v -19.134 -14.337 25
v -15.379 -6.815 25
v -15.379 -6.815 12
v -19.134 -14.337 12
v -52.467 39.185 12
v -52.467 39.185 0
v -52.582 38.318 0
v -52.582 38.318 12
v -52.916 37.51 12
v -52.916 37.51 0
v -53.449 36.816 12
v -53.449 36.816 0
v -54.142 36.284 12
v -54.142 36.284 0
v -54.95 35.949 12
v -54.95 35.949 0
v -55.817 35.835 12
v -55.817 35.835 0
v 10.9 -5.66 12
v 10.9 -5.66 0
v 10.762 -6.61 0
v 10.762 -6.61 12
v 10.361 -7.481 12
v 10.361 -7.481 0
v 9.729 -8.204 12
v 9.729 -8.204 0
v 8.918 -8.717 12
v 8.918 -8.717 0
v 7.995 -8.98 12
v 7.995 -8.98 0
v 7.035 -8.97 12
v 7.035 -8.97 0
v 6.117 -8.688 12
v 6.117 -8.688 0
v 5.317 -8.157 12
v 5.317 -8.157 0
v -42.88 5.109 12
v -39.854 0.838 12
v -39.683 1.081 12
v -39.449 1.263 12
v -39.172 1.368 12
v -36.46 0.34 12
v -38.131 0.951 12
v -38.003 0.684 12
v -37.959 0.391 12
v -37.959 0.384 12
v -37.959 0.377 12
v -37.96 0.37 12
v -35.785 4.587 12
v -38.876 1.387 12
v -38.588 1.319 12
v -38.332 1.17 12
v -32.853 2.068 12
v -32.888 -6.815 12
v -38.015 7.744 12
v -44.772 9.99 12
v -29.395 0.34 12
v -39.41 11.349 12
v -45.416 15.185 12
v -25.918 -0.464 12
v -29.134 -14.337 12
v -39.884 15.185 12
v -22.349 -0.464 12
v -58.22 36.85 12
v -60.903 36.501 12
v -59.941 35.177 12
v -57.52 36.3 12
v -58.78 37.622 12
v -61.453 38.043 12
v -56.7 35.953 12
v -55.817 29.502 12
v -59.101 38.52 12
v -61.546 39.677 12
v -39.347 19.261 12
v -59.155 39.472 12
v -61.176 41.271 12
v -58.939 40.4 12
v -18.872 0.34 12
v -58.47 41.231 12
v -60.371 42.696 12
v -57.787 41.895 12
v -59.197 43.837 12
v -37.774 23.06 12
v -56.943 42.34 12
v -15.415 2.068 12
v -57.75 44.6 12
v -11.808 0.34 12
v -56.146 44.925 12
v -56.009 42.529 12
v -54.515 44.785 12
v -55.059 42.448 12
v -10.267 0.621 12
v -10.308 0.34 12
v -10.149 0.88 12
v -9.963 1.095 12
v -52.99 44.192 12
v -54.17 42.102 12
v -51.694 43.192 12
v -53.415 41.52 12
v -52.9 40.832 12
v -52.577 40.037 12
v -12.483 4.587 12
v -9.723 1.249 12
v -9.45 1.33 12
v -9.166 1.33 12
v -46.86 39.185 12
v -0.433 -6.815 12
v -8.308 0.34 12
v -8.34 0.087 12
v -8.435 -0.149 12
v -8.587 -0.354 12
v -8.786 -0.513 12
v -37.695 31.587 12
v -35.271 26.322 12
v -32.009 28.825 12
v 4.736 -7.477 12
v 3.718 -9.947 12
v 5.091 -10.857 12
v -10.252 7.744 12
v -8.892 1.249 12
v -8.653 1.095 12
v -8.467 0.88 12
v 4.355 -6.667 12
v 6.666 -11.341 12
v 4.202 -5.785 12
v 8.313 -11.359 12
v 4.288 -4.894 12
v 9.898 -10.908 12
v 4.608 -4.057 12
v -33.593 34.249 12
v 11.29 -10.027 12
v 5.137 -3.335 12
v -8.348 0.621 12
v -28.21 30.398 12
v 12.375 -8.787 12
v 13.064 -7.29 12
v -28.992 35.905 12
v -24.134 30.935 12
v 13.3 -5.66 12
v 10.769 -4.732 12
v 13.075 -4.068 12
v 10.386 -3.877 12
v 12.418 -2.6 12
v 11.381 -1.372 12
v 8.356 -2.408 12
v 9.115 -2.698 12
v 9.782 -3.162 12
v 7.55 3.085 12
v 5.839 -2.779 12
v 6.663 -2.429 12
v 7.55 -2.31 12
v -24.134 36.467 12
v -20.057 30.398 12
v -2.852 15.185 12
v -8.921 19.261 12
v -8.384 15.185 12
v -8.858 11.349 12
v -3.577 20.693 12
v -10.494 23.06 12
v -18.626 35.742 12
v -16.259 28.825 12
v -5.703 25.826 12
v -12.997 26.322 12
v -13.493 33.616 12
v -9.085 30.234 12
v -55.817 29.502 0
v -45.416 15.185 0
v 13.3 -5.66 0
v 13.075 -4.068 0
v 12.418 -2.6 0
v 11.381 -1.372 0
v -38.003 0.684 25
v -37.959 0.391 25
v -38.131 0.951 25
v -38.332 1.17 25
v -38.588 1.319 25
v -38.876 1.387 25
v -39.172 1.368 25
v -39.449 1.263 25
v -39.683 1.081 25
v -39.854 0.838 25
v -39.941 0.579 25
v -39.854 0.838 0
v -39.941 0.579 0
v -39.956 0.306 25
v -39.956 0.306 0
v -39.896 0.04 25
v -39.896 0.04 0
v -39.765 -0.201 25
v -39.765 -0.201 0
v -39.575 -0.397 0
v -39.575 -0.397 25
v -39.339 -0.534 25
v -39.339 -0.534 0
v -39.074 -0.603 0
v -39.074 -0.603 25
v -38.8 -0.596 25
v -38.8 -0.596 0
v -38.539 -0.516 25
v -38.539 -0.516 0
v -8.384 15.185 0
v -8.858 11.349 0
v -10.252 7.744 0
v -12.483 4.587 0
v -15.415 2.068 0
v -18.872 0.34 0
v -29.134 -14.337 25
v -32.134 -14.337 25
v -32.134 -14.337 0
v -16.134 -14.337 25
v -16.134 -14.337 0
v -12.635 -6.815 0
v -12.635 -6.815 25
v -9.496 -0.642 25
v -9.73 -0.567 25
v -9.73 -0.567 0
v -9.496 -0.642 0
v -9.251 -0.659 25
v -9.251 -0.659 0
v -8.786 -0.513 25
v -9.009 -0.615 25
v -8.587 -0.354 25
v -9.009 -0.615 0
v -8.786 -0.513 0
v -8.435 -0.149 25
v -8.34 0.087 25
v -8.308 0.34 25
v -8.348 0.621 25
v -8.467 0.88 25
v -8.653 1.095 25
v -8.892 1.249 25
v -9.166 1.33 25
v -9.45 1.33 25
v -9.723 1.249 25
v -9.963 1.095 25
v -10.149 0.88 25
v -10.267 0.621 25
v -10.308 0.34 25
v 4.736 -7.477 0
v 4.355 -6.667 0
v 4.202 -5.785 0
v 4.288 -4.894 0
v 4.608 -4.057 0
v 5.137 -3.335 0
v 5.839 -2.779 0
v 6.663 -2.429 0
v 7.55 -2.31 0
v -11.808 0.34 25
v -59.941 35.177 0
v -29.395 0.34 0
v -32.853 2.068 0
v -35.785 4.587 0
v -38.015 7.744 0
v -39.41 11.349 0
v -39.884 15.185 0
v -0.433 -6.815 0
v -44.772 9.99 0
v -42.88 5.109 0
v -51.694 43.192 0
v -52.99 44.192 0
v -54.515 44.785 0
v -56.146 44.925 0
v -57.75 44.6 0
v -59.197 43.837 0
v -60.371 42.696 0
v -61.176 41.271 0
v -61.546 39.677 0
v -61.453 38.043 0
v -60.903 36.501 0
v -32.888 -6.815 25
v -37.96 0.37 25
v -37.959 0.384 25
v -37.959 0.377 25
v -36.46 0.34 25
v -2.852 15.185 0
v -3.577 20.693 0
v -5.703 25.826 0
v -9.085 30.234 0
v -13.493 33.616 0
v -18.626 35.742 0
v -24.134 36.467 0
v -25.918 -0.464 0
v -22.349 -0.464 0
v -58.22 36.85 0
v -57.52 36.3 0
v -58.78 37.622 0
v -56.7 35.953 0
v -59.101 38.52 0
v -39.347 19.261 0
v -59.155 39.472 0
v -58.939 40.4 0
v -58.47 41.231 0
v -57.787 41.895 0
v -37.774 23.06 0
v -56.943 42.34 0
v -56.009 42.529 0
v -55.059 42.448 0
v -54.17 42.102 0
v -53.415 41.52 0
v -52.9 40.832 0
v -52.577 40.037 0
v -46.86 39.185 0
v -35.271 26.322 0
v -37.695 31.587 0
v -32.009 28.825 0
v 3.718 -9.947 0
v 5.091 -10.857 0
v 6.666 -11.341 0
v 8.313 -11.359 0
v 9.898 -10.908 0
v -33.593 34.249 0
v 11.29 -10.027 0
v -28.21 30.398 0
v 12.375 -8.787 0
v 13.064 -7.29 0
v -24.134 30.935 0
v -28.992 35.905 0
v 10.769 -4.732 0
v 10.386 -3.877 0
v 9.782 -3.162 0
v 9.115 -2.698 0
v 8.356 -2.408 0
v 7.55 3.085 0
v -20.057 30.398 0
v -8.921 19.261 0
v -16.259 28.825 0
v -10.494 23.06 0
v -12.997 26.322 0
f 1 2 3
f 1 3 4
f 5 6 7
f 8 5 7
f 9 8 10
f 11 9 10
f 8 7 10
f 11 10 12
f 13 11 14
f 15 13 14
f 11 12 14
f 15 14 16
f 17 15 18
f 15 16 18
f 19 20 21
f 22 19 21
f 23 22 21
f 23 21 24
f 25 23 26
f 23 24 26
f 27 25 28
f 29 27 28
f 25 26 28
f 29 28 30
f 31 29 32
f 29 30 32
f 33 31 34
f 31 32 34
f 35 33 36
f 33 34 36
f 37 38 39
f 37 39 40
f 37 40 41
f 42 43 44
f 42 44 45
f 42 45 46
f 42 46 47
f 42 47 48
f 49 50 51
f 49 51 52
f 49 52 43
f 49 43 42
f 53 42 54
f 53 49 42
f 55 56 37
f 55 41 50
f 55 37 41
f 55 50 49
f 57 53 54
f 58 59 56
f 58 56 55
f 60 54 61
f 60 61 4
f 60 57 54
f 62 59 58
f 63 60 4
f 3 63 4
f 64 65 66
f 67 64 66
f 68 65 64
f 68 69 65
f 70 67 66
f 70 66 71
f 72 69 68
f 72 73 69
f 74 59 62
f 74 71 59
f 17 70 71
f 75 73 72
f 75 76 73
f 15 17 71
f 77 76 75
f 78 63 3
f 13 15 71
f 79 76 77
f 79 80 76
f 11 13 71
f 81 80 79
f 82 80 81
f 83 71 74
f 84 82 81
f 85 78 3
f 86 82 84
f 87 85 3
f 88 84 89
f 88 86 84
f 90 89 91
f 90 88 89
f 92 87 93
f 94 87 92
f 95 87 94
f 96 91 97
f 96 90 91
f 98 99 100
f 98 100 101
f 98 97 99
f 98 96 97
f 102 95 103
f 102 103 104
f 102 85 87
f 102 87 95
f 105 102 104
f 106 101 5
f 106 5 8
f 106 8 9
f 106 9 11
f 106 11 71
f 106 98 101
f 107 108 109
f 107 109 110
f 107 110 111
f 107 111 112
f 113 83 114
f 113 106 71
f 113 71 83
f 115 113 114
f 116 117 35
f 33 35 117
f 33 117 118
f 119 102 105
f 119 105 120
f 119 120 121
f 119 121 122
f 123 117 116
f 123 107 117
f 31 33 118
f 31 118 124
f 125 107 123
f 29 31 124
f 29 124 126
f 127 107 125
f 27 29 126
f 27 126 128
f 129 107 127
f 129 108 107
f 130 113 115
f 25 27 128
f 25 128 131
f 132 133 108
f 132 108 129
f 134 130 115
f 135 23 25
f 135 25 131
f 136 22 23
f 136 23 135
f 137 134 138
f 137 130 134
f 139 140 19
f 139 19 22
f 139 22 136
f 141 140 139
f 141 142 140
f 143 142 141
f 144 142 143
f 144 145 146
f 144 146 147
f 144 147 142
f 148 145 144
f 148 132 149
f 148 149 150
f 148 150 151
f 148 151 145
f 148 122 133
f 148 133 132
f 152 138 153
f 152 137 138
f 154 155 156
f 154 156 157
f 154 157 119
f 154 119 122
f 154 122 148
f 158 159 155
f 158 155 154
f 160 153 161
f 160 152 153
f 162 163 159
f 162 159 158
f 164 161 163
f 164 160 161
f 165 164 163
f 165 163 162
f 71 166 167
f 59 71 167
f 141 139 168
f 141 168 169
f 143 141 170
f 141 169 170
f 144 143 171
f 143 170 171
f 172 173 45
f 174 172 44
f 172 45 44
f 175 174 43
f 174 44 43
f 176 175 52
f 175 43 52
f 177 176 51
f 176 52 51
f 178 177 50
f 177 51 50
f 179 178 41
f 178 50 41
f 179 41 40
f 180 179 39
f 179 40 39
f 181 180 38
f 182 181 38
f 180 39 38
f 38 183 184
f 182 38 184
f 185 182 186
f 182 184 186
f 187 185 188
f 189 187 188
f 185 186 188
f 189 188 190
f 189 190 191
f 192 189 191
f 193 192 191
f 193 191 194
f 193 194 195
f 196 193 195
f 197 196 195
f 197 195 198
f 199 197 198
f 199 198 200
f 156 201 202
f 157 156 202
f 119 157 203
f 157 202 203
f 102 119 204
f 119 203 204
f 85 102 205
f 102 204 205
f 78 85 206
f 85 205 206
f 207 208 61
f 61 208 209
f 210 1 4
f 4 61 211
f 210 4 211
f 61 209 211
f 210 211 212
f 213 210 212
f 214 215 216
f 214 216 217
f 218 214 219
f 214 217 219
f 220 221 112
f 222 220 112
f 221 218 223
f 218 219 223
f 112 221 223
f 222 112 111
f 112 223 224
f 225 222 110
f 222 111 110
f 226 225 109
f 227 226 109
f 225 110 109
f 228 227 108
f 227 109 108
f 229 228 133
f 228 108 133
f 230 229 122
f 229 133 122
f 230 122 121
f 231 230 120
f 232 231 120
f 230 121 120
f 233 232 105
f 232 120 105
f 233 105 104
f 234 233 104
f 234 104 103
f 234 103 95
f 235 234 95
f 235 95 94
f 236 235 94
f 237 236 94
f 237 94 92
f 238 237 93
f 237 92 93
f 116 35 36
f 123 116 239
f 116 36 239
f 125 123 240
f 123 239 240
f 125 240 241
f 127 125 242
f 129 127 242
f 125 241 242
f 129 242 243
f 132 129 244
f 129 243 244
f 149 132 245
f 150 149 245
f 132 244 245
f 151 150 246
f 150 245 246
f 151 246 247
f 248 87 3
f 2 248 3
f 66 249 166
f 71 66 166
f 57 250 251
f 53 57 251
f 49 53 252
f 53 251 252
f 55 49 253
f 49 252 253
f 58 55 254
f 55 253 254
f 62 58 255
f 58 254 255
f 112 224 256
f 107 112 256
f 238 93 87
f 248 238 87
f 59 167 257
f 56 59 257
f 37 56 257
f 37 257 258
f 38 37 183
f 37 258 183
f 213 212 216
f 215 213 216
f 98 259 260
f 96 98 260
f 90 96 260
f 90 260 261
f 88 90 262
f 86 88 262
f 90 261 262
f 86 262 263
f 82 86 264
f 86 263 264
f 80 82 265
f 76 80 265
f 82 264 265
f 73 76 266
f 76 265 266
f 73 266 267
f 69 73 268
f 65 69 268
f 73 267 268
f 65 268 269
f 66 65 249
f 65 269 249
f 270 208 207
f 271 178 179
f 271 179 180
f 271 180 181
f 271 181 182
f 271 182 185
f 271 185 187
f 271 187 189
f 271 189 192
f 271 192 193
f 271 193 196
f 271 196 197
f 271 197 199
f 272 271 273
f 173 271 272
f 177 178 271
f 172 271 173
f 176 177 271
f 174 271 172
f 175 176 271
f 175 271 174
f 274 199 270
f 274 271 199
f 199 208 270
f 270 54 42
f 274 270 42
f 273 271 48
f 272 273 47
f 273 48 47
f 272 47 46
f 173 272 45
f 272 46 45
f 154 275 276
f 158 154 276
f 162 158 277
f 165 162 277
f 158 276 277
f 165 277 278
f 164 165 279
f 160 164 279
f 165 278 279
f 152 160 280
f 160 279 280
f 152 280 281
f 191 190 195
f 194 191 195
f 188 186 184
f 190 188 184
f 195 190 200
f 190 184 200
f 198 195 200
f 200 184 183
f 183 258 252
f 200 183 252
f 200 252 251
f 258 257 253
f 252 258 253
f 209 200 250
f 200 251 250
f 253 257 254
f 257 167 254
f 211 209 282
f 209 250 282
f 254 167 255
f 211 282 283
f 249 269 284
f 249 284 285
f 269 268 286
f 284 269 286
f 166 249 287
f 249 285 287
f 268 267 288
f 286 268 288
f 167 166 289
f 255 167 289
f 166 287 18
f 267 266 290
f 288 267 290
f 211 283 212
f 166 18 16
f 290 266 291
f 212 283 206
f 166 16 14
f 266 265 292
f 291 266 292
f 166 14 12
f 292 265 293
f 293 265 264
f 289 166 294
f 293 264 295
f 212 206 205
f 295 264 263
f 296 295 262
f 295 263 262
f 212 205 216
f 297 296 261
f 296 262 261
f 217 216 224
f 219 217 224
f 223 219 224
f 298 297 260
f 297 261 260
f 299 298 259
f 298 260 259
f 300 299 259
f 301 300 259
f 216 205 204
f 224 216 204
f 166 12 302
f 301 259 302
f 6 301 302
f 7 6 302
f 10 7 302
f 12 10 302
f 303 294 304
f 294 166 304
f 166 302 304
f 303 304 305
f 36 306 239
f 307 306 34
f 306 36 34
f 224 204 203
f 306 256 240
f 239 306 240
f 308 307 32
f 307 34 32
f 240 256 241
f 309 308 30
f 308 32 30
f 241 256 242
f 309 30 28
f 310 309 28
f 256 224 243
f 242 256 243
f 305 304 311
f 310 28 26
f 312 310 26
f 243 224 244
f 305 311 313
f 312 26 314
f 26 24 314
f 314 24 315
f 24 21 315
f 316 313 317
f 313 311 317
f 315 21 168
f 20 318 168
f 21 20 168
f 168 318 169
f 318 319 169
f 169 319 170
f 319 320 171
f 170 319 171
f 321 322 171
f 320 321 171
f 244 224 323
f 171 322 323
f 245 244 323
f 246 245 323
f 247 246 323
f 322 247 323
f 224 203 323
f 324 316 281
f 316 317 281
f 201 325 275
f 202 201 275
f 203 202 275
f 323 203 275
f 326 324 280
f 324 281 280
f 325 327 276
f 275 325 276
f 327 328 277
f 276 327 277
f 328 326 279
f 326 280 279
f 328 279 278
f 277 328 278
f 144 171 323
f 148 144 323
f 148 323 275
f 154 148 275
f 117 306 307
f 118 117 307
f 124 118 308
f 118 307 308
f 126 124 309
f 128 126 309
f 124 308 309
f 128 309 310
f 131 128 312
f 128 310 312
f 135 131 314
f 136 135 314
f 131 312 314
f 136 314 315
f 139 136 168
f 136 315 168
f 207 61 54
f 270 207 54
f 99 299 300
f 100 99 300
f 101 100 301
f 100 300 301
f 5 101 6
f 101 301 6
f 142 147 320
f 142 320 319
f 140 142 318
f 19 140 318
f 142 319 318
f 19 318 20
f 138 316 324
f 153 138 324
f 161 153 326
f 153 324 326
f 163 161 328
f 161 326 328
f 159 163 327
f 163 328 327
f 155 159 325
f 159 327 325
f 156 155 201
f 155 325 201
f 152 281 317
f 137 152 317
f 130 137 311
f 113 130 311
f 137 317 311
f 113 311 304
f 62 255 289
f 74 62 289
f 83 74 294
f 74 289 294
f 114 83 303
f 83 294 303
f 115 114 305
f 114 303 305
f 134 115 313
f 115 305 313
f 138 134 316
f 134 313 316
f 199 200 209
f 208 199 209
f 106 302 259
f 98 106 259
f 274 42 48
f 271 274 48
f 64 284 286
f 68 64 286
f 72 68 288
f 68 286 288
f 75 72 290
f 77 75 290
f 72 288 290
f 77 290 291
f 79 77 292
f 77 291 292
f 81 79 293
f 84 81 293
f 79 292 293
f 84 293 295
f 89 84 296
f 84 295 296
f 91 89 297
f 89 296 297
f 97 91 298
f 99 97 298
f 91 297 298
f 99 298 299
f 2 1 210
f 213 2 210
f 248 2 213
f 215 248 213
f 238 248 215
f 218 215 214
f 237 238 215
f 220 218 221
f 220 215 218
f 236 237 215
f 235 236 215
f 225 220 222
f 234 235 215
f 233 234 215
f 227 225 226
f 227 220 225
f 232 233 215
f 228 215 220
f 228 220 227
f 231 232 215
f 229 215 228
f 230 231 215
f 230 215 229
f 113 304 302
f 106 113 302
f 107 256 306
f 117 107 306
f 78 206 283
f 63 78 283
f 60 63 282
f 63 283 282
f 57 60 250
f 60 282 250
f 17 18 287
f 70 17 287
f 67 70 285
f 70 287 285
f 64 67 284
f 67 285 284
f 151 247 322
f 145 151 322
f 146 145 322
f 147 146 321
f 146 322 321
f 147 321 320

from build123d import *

# Parameters (mm, degrees)
F1_DEPTH = 12
F2_DEPTH = 25


with BuildPart() as f1:
    # F0 (on Top) → F1 (new body)
    with BuildSketch(Plane.XY):
        with BuildLine():
            ThreePointArc((-53.4150354704, 41.5196209399), (-52.7133447938, 40.4447331982), (-52.4674114412, 39.1848640586))
            Line((-52.4674114412, 39.1848640586), (-50.0674114412, 39.1848640586))
            ThreePointArc((-50.0674114412, 39.1848640586), (-50.4895358525, 41.3473260146), (-51.6939302973, 43.1922825863))
            Line((-51.6939302973, 43.1922825863), (-53.4150354704, 41.5196209399))
        make_face()
        with BuildLine():
            Line((-50.0674114412, 39.1848640586), (-52.4674114412, 39.1848640586))
            ThreePointArc((-52.4674114412, 39.1848640586), (-53.4486037242, 36.8160563416), (-55.8174114412, 35.8348640586))
            Line((-55.8174114412, 35.8348640586), (-55.8174114412, 33.4348640586))
            ThreePointArc((-55.8174114412, 33.4348640586), (-51.7515474493, 35.1190000668), (-50.0674114412, 39.1848640586))
        make_face()
        with BuildLine():
            ThreePointArc((-51.6939302973, 43.1922825863), (-50.4895358525, 41.3473260146), (-50.0674114412, 39.1848640586))
            Line((-50.0674114412, 39.1848640586), (-46.8600699283, 39.1848640586))
            Line((-46.8600699283, 39.1848640586), (-51.6939302973, 43.1922825863))
        make_face()
        with BuildLine():
            Line((-46.8600699283, 39.1848640586), (-50.0674114412, 39.1848640586))
            ThreePointArc((-50.0674114412, 39.1848640586), (-51.7515474493, 35.1190000668), (-55.8174114412, 33.4348640586))
            Line((-55.8174114412, 33.4348640586), (-55.8174114412, 29.501699648))
            Line((-55.8174114412, 29.501699648), (-45.4160998232, 15.1848640586))
            ThreePointArc((-45.4160998232, 15.1848640586), (-43.3893572478, 24.2490610317), (-37.6951490668, 31.5868635246))
            Line((-37.6951490668, 31.5868635246), (-46.8600699283, 39.1848640586))
        make_face()
        with BuildLine():
            Line((-55.8174114412, 33.4348640586), (-55.8174114412, 35.8348640586))
            ThreePointArc((-55.8174114412, 35.8348640586), (-57.1214560047, 36.099095471), (-58.219787412, 36.8501071773))
            Line((-58.219787412, 36.8501071773), (-59.9408925851, 35.177445531))
            ThreePointArc((-59.9408925851, 35.177445531), (-58.0556968861, 33.8883955874), (-55.8174114412, 33.4348640586))
        make_face()
        with BuildLine():
            ThreePointArc((-58.219787412, 36.8501071773), (-58.1521683225, 41.5872400294), (-53.4150354704, 41.5196209399))
            Line((-53.4150354704, 41.5196209399), (-51.6939302973, 43.1922825863))
            ThreePointArc((-51.6939302973, 43.1922825863), (-59.8248299688, 43.3083452025), (-59.9408925851, 35.177445531))
            Line((-59.9408925851, 35.177445531), (-58.219787412, 36.8501071773))
        make_face()
        with BuildLine():
            Line((-55.8174114412, 29.501699648), (-55.8174114412, 33.4348640586))
            ThreePointArc((-55.8174114412, 33.4348640586), (-58.0556968861, 33.8883955874), (-59.9408925851, 35.177445531))
            Line((-59.9408925851, 35.177445531), (-55.8174114412, 29.501699648))
        make_face()
        with BuildLine():
            ThreePointArc((-24.1338330771, 36.4671308048), (-31.3401896478, 35.2099309207), (-37.6951490668, 31.5868635246))
            ThreePointArc((-37.6951490668, 31.5868635246), (-43.3893572478, 24.2490610317), (-45.4160998232, 15.1848640586))
            Line((-45.4160998232, 15.1848640586), (-42.6338443592, 15.1848640586))
            Line((-42.6338443592, 15.1848640586), (-39.8838330771, 15.1848640586))
            ThreePointArc((-39.8838330771, 15.1848640586), (-35.2707648808, 26.3217958623), (-24.1338330771, 30.9348640586))
            Line((-24.1338330771, 30.9348640586), (-24.1338330771, 36.4671308048))
        make_face()
        with BuildLine():
            ThreePointArc((-2.8515663309, 15.1848640586), (-9.0849979418, 30.2336991939), (-24.1338330771, 36.4671308048))
            Line((-24.1338330771, 36.4671308048), (-24.1338330771, 30.9348640586))
            ThreePointArc((-24.1338330771, 30.9348640586), (-12.9969012734, 26.3217958623), (-8.3838330771, 15.1848640586))
            Line((-8.3838330771, 15.1848640586), (-5.6338443592, 15.1848640586))
            Line((-5.6338443592, 15.1848640586), (-2.8515663309, 15.1848640586))
        make_face()
        with BuildLine():
            Line((-42.6338443592, 15.1848640586), (-45.4160998232, 15.1848640586))
            ThreePointArc((-45.4160998232, 15.1848640586), (-43.9768109648, 7.4912884008), (-39.8536184288, 0.8383234878))
            ThreePointArc((-39.8536184288, 0.8383234878), (-38.7294279835, 1.3640933992), (-37.9593089049, 0.3908746355))
            ThreePointArc((-37.9593089049, 0.3908746355), (-37.9593613235, 0.3806357667), (-37.9595185738, 0.3703979712))
            Line((-37.9595185738, 0.3703979712), (-36.4598330771, 0.3396829748))
            Line((-36.4598330771, 0.3396829748), (-42.6338443592, 15.1848640586))
        make_face()
        with BuildLine():
            Line((7.549745287, 3.085096959), (-2.8515663309, 15.1848640586))
            Line((-2.8515663309, 15.1848640586), (-5.6338443592, 15.1848640586))
            Line((-5.6338443592, 15.1848640586), (-11.8078330771, 0.3396829748))
            Line((-11.8078330771, 0.3396829748), (-10.3078330771, 0.3396829748))
            ThreePointArc((-10.3078330771, 0.3396829748), (-9.3078330771, 1.3396829748), (-8.3078330771, 0.3396829748))
            ThreePointArc((-8.3078330771, 0.3396829748), (-8.4354300981, -0.1491043433), (-8.7856591617, -0.5131560499))
            Line((-8.7856591617, -0.5131560499), (-0.4328217774, -6.8151040581))
            Line((-0.4328217774, -6.8151040581), (1.9170580195, -6.8151040581))
            ThreePointArc((1.9170580195, -6.8151040581), (3.0940181915, -2.0251192122), (7.549745287, 0.0904625331))
            Line((7.549745287, 0.0904625331), (7.549745287, 3.085096959))
        make_face()
        with BuildLine():
            Line((-39.8838330771, 15.1848640586), (-42.6338443592, 15.1848640586))
            Line((-42.6338443592, 15.1848640586), (-36.4598330771, 0.3396829748))
            Line((-36.4598330771, 0.3396829748), (-29.3953061207, 0.3396829748))
            ThreePointArc((-29.3953061207, 0.3396829748), (-36.9971666349, 6.0965666504), (-39.8838330771, 15.1848640586))
        make_face()
        with BuildLine():
            ThreePointArc((-37.9593089049, 0.3908746355), (-38.7294279835, 1.3640933992), (-39.8536184288, 0.8383234878))
            ThreePointArc((-39.8536184288, 0.8383234878), (-39.649771274, 0.6181025887), (-39.4428392954, 0.4007778014))
            Line((-39.4428392954, 0.4007778014), (-38.9593089049, 0.3908746355))
            Line((-38.9593089049, 0.3908746355), (-37.9595185738, 0.3703979712))
            ThreePointArc((-37.9595185738, 0.3703979712), (-37.9593613235, 0.3806357667), (-37.9593089049, 0.3908746355))
        make_face()
        with BuildLine():
            ThreePointArc((-39.4428392954, 0.4007778014), (-39.649771274, 0.6181025887), (-39.8536184288, 0.8383234878))
            ThreePointArc((-39.8536184288, 0.8383234878), (-39.6769215407, -0.3055678279), (-38.5388324508, -0.5164288151))
            Line((-38.5388324508, -0.5164288151), (-38.5671831653, -0.4552536867))
            ThreePointArc((-38.5671831653, -0.4552536867), (-39.0111694362, -0.0335373263), (-39.4428392954, 0.4007778014))
        make_face()
        with BuildLine():
            Line((-5.6338443592, 15.1848640586), (-8.3838330771, 15.1848640586))
            ThreePointArc((-8.3838330771, 15.1848640586), (-11.2704995193, 6.0965666504), (-18.8723600334, 0.3396829748))
            Line((-18.8723600334, 0.3396829748), (-11.8078330771, 0.3396829748))
            Line((-11.8078330771, 0.3396829748), (-5.6338443592, 15.1848640586))
        make_face()
        with BuildLine():
            Line((11.3814063915, -1.3722454101), (7.549745287, 3.085096959))
            Line((7.549745287, 3.085096959), (7.549745287, 0.0904625331))
            ThreePointArc((7.549745287, 0.0904625331), (9.6004245249, -0.2876463043), (11.3814063915, -1.3722454101))
        make_face()
        with BuildLine():
            Line((-29.3953061207, 0.3396829748), (-36.4598330771, 0.3396829748))
            Line((-36.4598330771, 0.3396829748), (-32.8884867815, -6.8151040581))
            Line((-32.8884867815, -6.8151040581), (-24.1338330771, -6.8151040581))
            Line((-24.1338330771, -6.8151040581), (-24.1338330771, -0.5651359414))
            ThreePointArc((-24.1338330771, -0.5651359414), (-26.8031867376, -0.3372830556), (-29.3953061207, 0.3396829748))
        make_face()
        with BuildLine():
            Line((-32.8884867815, -6.8151040581), (-36.4598330771, 0.3396829748))
            Line((-36.4598330771, 0.3396829748), (-37.9595185738, 0.3703979712))
            ThreePointArc((-37.9595185738, 0.3703979712), (-38.1221082882, -0.1560212663), (-38.5388324508, -0.5164288151))
            Line((-38.5388324508, -0.5164288151), (-35.6198039494, -6.8151040581))
            Line((-35.6198039494, -6.8151040581), (-32.8884867815, -6.8151040581))
        make_face()
        with BuildLine():
            Line((-38.9593089049, 0.3908746355), (-39.4428392954, 0.4007778014))
            ThreePointArc((-39.4428392954, 0.4007778014), (-39.0111694362, -0.0335373263), (-38.5671831653, -0.4552536867))
            Line((-38.5671831653, -0.4552536867), (-38.9593089049, 0.3908746355))
        make_face()
        with BuildLine():
            Line((-38.5671831653, -0.4552536867), (-38.5388324508, -0.5164288151))
            ThreePointArc((-38.5388324508, -0.5164288151), (-38.1221082882, -0.1560212663), (-37.9595185738, 0.3703979712))
            Line((-37.9595185738, 0.3703979712), (-38.9593089049, 0.3908746355))
            Line((-38.9593089049, 0.3908746355), (-38.5671831653, -0.4552536867))
        make_face()
        with BuildLine():
            Line((-11.8078330771, 0.3396829748), (-18.8723600334, 0.3396829748))
            ThreePointArc((-18.8723600334, 0.3396829748), (-21.4644794165, -0.3372830556), (-24.1338330771, -0.5651359414))
            Line((-24.1338330771, -0.5651359414), (-24.1338330771, -6.8151040581))
            Line((-24.1338330771, -6.8151040581), (-15.3791793726, -6.8151040581))
            Line((-15.3791793726, -6.8151040581), (-11.8078330771, 0.3396829748))
        make_face()
        with BuildLine():
            Line((-10.3078330771, 0.3396829748), (-11.8078330771, 0.3396829748))
            Line((-11.8078330771, 0.3396829748), (-15.3791793726, -6.8151040581))
            Line((-15.3791793726, -6.8151040581), (-12.6354347442, -6.8151040581))
            Line((-12.6354347442, -6.8151040581), (-9.7295423368, -0.5670481321))
            ThreePointArc((-9.7295423368, -0.5670481321), (-10.1509550314, -0.1980394165), (-10.3078330771, 0.3396829748))
        make_face()
        with BuildLine():
            ThreePointArc((11.3814063915, -1.3722454101), (9.6004245249, -0.2876463043), (7.549745287, 0.0904625331))
            Line((7.549745287, 0.0904625331), (7.549745287, -2.3095374669))
            ThreePointArc((7.549745287, -2.3095374669), (8.744488843, -2.5298269634), (9.7821043653, -3.1617238338))
            Line((9.7821043653, -3.1617238338), (11.3814063915, -1.3722454101))
        make_face()
        with BuildLine():
            Line((7.549745287, -2.3095374669), (7.549745287, 0.0904625331))
            ThreePointArc((7.549745287, 0.0904625331), (3.0940181915, -2.0251192122), (1.9170580195, -6.8151040581))
            ThreePointArc((1.9170580195, -6.8151040581), (2.5652294004, -8.526086154), (3.7180841826, -9.9468295237))
            Line((3.7180841826, -9.9468295237), (5.3173862088, -8.1573511))
            ThreePointArc((5.3173862088, -8.1573511), (4.4200347836, -4.4647939109), (7.549745287, -2.3095374669))
        make_face()
        with BuildLine():
            ThreePointArc((13.299745287, -5.6595374669), (12.7982951511, -3.3110859931), (11.3814063915, -1.3722454101))
            Line((11.3814063915, -1.3722454101), (9.7821043653, -3.1617238338))
            ThreePointArc((9.7821043653, -3.1617238338), (10.6075960774, -4.291309217), (10.899745287, -5.6595374669))
            ThreePointArc((10.899745287, -5.6595374669), (8.917973537, -8.7173882573), (5.3173862088, -8.1573511))
            Line((5.3173862088, -8.1573511), (3.7180841826, -9.9468295237))
            ThreePointArc((3.7180841826, -9.9468295237), (9.8981967608, -10.9080873309), (13.299745287, -5.6595374669))
        make_face()
        Polygon((-24.1338330771, -6.8151040581), (-32.8884867815, -6.8151040581), (-29.1338330771, -14.3371266833), (-24.1338330771, -14.3371266833), (-24.1338330771, -7.8529477167), align=None)
        Polygon((-29.1338330771, -14.3371266833), (-32.8884867815, -6.8151040581), (-35.6198039494, -6.8151040581), (-32.1338330771, -14.3371266833), align=None)
        Polygon((-12.6354347442, -6.8151040581), (-15.3791793726, -6.8151040581), (-19.1338330771, -14.3371266833), (-16.1338330771, -14.3371266833), align=None)
        Polygon((-19.1338330771, -14.3371266833), (-15.3791793726, -6.8151040581), (-24.1338330771, -6.8151040581), (-24.1338330771, -7.8529477167), (-24.1338330771, -14.3371266833), align=None)
        with BuildLine():
            ThreePointArc((-8.3078330771, 0.3396829748), (-9.3078330771, 1.3396829748), (-10.3078330771, 0.3396829748))
            Line((-10.3078330771, 0.3396829748), (-9.3078330771, 0.3396829748))
            Line((-9.3078330771, 0.3396829748), (-9.4658153661, 0))
            Line((-9.4658153661, 0), (-8.7856591617, -0.5131560499))
            ThreePointArc((-8.7856591617, -0.5131560499), (-8.4354300981, -0.1491043433), (-8.3078330771, 0.3396829748))
        make_face()
        with BuildLine():
            Line((-9.3078330771, 0.3396829748), (-10.3078330771, 0.3396829748))
            ThreePointArc((-10.3078330771, 0.3396829748), (-10.1509550314, -0.1980394165), (-9.7295423368, -0.5670481321))
            Line((-9.7295423368, -0.5670481321), (-9.4658153661, 0))
            Line((-9.4658153661, 0), (-9.3078330771, 0.3396829748))
        make_face()
        with BuildLine():
            ThreePointArc((3.7180841826, -9.9468295237), (2.5652294004, -8.526086154), (1.9170580195, -6.8151040581))
            Line((1.9170580195, -6.8151040581), (-0.4328217774, -6.8151040581))
            Line((-0.4328217774, -6.8151040581), (3.7180841826, -9.9468295237))
        make_face()
        with BuildLine():
            Line((-9.4658153661, 0), (-9.7295423368, -0.5670481321))
            ThreePointArc((-9.7295423368, -0.5670481321), (-9.2508297799, -0.6586910153), (-8.7856591617, -0.5131560499))
            Line((-8.7856591617, -0.5131560499), (-9.4658153661, 0))
        make_face()
    extrude(amount=F1_DEPTH)

    # F0 (on Top) → F2 (join)
    with BuildSketch(Plane.XY):
        Polygon((-29.1338330771, -14.3371266833), (-32.8884867815, -6.8151040581), (-35.6198039494, -6.8151040581), (-32.1338330771, -14.3371266833), align=None)
        with BuildLine():
            Line((-32.8884867815, -6.8151040581), (-36.4598330771, 0.3396829748))
            Line((-36.4598330771, 0.3396829748), (-37.9595185738, 0.3703979712))
            ThreePointArc((-37.9595185738, 0.3703979712), (-38.1221082882, -0.1560212663), (-38.5388324508, -0.5164288151))
            Line((-38.5388324508, -0.5164288151), (-35.6198039494, -6.8151040581))
            Line((-35.6198039494, -6.8151040581), (-32.8884867815, -6.8151040581))
        make_face()
        with BuildLine():
            Line((-38.5671831653, -0.4552536867), (-38.5388324508, -0.5164288151))
            ThreePointArc((-38.5388324508, -0.5164288151), (-38.1221082882, -0.1560212663), (-37.9595185738, 0.3703979712))
            Line((-37.9595185738, 0.3703979712), (-38.9593089049, 0.3908746355))
            Line((-38.9593089049, 0.3908746355), (-38.5671831653, -0.4552536867))
        make_face()
        with BuildLine():
            ThreePointArc((-37.9593089049, 0.3908746355), (-38.7294279835, 1.3640933992), (-39.8536184288, 0.8383234878))
            ThreePointArc((-39.8536184288, 0.8383234878), (-39.649771274, 0.6181025887), (-39.4428392954, 0.4007778014))
            Line((-39.4428392954, 0.4007778014), (-38.9593089049, 0.3908746355))
            Line((-38.9593089049, 0.3908746355), (-37.9595185738, 0.3703979712))
            ThreePointArc((-37.9595185738, 0.3703979712), (-37.9593613235, 0.3806357667), (-37.9593089049, 0.3908746355))
        make_face()
        with BuildLine():
            ThreePointArc((-39.4428392954, 0.4007778014), (-39.649771274, 0.6181025887), (-39.8536184288, 0.8383234878))
            ThreePointArc((-39.8536184288, 0.8383234878), (-39.6769215407, -0.3055678279), (-38.5388324508, -0.5164288151))
            Line((-38.5388324508, -0.5164288151), (-38.5671831653, -0.4552536867))
            ThreePointArc((-38.5671831653, -0.4552536867), (-39.0111694362, -0.0335373263), (-39.4428392954, 0.4007778014))
        make_face()
        with BuildLine():
            Line((-38.9593089049, 0.3908746355), (-39.4428392954, 0.4007778014))
            ThreePointArc((-39.4428392954, 0.4007778014), (-39.0111694362, -0.0335373263), (-38.5671831653, -0.4552536867))
            Line((-38.5671831653, -0.4552536867), (-38.9593089049, 0.3908746355))
        make_face()
        with BuildLine():
            Line((-9.3078330771, 0.3396829748), (-10.3078330771, 0.3396829748))
            ThreePointArc((-10.3078330771, 0.3396829748), (-10.1509550314, -0.1980394165), (-9.7295423368, -0.5670481321))
            Line((-9.7295423368, -0.5670481321), (-9.4658153661, 0))
            Line((-9.4658153661, 0), (-9.3078330771, 0.3396829748))
        make_face()
        with BuildLine():
            ThreePointArc((-8.3078330771, 0.3396829748), (-9.3078330771, 1.3396829748), (-10.3078330771, 0.3396829748))
            Line((-10.3078330771, 0.3396829748), (-9.3078330771, 0.3396829748))
            Line((-9.3078330771, 0.3396829748), (-9.4658153661, 0))
            Line((-9.4658153661, 0), (-8.7856591617, -0.5131560499))
            ThreePointArc((-8.7856591617, -0.5131560499), (-8.4354300981, -0.1491043433), (-8.3078330771, 0.3396829748))
        make_face()
        with BuildLine():
            Line((-9.4658153661, 0), (-9.7295423368, -0.5670481321))
            ThreePointArc((-9.7295423368, -0.5670481321), (-9.2508297799, -0.6586910153), (-8.7856591617, -0.5131560499))
            Line((-8.7856591617, -0.5131560499), (-9.4658153661, 0))
        make_face()
        with BuildLine():
            Line((-10.3078330771, 0.3396829748), (-11.8078330771, 0.3396829748))
            Line((-11.8078330771, 0.3396829748), (-15.3791793726, -6.8151040581))
            Line((-15.3791793726, -6.8151040581), (-12.6354347442, -6.8151040581))
            Line((-12.6354347442, -6.8151040581), (-9.7295423368, -0.5670481321))
            ThreePointArc((-9.7295423368, -0.5670481321), (-10.1509550314, -0.1980394165), (-10.3078330771, 0.3396829748))
        make_face()
        Polygon((-12.6354347442, -6.8151040581), (-15.3791793726, -6.8151040581), (-19.1338330771, -14.3371266833), (-16.1338330771, -14.3371266833), align=None)
    extrude(amount=F2_DEPTH)


solid = f1.part
